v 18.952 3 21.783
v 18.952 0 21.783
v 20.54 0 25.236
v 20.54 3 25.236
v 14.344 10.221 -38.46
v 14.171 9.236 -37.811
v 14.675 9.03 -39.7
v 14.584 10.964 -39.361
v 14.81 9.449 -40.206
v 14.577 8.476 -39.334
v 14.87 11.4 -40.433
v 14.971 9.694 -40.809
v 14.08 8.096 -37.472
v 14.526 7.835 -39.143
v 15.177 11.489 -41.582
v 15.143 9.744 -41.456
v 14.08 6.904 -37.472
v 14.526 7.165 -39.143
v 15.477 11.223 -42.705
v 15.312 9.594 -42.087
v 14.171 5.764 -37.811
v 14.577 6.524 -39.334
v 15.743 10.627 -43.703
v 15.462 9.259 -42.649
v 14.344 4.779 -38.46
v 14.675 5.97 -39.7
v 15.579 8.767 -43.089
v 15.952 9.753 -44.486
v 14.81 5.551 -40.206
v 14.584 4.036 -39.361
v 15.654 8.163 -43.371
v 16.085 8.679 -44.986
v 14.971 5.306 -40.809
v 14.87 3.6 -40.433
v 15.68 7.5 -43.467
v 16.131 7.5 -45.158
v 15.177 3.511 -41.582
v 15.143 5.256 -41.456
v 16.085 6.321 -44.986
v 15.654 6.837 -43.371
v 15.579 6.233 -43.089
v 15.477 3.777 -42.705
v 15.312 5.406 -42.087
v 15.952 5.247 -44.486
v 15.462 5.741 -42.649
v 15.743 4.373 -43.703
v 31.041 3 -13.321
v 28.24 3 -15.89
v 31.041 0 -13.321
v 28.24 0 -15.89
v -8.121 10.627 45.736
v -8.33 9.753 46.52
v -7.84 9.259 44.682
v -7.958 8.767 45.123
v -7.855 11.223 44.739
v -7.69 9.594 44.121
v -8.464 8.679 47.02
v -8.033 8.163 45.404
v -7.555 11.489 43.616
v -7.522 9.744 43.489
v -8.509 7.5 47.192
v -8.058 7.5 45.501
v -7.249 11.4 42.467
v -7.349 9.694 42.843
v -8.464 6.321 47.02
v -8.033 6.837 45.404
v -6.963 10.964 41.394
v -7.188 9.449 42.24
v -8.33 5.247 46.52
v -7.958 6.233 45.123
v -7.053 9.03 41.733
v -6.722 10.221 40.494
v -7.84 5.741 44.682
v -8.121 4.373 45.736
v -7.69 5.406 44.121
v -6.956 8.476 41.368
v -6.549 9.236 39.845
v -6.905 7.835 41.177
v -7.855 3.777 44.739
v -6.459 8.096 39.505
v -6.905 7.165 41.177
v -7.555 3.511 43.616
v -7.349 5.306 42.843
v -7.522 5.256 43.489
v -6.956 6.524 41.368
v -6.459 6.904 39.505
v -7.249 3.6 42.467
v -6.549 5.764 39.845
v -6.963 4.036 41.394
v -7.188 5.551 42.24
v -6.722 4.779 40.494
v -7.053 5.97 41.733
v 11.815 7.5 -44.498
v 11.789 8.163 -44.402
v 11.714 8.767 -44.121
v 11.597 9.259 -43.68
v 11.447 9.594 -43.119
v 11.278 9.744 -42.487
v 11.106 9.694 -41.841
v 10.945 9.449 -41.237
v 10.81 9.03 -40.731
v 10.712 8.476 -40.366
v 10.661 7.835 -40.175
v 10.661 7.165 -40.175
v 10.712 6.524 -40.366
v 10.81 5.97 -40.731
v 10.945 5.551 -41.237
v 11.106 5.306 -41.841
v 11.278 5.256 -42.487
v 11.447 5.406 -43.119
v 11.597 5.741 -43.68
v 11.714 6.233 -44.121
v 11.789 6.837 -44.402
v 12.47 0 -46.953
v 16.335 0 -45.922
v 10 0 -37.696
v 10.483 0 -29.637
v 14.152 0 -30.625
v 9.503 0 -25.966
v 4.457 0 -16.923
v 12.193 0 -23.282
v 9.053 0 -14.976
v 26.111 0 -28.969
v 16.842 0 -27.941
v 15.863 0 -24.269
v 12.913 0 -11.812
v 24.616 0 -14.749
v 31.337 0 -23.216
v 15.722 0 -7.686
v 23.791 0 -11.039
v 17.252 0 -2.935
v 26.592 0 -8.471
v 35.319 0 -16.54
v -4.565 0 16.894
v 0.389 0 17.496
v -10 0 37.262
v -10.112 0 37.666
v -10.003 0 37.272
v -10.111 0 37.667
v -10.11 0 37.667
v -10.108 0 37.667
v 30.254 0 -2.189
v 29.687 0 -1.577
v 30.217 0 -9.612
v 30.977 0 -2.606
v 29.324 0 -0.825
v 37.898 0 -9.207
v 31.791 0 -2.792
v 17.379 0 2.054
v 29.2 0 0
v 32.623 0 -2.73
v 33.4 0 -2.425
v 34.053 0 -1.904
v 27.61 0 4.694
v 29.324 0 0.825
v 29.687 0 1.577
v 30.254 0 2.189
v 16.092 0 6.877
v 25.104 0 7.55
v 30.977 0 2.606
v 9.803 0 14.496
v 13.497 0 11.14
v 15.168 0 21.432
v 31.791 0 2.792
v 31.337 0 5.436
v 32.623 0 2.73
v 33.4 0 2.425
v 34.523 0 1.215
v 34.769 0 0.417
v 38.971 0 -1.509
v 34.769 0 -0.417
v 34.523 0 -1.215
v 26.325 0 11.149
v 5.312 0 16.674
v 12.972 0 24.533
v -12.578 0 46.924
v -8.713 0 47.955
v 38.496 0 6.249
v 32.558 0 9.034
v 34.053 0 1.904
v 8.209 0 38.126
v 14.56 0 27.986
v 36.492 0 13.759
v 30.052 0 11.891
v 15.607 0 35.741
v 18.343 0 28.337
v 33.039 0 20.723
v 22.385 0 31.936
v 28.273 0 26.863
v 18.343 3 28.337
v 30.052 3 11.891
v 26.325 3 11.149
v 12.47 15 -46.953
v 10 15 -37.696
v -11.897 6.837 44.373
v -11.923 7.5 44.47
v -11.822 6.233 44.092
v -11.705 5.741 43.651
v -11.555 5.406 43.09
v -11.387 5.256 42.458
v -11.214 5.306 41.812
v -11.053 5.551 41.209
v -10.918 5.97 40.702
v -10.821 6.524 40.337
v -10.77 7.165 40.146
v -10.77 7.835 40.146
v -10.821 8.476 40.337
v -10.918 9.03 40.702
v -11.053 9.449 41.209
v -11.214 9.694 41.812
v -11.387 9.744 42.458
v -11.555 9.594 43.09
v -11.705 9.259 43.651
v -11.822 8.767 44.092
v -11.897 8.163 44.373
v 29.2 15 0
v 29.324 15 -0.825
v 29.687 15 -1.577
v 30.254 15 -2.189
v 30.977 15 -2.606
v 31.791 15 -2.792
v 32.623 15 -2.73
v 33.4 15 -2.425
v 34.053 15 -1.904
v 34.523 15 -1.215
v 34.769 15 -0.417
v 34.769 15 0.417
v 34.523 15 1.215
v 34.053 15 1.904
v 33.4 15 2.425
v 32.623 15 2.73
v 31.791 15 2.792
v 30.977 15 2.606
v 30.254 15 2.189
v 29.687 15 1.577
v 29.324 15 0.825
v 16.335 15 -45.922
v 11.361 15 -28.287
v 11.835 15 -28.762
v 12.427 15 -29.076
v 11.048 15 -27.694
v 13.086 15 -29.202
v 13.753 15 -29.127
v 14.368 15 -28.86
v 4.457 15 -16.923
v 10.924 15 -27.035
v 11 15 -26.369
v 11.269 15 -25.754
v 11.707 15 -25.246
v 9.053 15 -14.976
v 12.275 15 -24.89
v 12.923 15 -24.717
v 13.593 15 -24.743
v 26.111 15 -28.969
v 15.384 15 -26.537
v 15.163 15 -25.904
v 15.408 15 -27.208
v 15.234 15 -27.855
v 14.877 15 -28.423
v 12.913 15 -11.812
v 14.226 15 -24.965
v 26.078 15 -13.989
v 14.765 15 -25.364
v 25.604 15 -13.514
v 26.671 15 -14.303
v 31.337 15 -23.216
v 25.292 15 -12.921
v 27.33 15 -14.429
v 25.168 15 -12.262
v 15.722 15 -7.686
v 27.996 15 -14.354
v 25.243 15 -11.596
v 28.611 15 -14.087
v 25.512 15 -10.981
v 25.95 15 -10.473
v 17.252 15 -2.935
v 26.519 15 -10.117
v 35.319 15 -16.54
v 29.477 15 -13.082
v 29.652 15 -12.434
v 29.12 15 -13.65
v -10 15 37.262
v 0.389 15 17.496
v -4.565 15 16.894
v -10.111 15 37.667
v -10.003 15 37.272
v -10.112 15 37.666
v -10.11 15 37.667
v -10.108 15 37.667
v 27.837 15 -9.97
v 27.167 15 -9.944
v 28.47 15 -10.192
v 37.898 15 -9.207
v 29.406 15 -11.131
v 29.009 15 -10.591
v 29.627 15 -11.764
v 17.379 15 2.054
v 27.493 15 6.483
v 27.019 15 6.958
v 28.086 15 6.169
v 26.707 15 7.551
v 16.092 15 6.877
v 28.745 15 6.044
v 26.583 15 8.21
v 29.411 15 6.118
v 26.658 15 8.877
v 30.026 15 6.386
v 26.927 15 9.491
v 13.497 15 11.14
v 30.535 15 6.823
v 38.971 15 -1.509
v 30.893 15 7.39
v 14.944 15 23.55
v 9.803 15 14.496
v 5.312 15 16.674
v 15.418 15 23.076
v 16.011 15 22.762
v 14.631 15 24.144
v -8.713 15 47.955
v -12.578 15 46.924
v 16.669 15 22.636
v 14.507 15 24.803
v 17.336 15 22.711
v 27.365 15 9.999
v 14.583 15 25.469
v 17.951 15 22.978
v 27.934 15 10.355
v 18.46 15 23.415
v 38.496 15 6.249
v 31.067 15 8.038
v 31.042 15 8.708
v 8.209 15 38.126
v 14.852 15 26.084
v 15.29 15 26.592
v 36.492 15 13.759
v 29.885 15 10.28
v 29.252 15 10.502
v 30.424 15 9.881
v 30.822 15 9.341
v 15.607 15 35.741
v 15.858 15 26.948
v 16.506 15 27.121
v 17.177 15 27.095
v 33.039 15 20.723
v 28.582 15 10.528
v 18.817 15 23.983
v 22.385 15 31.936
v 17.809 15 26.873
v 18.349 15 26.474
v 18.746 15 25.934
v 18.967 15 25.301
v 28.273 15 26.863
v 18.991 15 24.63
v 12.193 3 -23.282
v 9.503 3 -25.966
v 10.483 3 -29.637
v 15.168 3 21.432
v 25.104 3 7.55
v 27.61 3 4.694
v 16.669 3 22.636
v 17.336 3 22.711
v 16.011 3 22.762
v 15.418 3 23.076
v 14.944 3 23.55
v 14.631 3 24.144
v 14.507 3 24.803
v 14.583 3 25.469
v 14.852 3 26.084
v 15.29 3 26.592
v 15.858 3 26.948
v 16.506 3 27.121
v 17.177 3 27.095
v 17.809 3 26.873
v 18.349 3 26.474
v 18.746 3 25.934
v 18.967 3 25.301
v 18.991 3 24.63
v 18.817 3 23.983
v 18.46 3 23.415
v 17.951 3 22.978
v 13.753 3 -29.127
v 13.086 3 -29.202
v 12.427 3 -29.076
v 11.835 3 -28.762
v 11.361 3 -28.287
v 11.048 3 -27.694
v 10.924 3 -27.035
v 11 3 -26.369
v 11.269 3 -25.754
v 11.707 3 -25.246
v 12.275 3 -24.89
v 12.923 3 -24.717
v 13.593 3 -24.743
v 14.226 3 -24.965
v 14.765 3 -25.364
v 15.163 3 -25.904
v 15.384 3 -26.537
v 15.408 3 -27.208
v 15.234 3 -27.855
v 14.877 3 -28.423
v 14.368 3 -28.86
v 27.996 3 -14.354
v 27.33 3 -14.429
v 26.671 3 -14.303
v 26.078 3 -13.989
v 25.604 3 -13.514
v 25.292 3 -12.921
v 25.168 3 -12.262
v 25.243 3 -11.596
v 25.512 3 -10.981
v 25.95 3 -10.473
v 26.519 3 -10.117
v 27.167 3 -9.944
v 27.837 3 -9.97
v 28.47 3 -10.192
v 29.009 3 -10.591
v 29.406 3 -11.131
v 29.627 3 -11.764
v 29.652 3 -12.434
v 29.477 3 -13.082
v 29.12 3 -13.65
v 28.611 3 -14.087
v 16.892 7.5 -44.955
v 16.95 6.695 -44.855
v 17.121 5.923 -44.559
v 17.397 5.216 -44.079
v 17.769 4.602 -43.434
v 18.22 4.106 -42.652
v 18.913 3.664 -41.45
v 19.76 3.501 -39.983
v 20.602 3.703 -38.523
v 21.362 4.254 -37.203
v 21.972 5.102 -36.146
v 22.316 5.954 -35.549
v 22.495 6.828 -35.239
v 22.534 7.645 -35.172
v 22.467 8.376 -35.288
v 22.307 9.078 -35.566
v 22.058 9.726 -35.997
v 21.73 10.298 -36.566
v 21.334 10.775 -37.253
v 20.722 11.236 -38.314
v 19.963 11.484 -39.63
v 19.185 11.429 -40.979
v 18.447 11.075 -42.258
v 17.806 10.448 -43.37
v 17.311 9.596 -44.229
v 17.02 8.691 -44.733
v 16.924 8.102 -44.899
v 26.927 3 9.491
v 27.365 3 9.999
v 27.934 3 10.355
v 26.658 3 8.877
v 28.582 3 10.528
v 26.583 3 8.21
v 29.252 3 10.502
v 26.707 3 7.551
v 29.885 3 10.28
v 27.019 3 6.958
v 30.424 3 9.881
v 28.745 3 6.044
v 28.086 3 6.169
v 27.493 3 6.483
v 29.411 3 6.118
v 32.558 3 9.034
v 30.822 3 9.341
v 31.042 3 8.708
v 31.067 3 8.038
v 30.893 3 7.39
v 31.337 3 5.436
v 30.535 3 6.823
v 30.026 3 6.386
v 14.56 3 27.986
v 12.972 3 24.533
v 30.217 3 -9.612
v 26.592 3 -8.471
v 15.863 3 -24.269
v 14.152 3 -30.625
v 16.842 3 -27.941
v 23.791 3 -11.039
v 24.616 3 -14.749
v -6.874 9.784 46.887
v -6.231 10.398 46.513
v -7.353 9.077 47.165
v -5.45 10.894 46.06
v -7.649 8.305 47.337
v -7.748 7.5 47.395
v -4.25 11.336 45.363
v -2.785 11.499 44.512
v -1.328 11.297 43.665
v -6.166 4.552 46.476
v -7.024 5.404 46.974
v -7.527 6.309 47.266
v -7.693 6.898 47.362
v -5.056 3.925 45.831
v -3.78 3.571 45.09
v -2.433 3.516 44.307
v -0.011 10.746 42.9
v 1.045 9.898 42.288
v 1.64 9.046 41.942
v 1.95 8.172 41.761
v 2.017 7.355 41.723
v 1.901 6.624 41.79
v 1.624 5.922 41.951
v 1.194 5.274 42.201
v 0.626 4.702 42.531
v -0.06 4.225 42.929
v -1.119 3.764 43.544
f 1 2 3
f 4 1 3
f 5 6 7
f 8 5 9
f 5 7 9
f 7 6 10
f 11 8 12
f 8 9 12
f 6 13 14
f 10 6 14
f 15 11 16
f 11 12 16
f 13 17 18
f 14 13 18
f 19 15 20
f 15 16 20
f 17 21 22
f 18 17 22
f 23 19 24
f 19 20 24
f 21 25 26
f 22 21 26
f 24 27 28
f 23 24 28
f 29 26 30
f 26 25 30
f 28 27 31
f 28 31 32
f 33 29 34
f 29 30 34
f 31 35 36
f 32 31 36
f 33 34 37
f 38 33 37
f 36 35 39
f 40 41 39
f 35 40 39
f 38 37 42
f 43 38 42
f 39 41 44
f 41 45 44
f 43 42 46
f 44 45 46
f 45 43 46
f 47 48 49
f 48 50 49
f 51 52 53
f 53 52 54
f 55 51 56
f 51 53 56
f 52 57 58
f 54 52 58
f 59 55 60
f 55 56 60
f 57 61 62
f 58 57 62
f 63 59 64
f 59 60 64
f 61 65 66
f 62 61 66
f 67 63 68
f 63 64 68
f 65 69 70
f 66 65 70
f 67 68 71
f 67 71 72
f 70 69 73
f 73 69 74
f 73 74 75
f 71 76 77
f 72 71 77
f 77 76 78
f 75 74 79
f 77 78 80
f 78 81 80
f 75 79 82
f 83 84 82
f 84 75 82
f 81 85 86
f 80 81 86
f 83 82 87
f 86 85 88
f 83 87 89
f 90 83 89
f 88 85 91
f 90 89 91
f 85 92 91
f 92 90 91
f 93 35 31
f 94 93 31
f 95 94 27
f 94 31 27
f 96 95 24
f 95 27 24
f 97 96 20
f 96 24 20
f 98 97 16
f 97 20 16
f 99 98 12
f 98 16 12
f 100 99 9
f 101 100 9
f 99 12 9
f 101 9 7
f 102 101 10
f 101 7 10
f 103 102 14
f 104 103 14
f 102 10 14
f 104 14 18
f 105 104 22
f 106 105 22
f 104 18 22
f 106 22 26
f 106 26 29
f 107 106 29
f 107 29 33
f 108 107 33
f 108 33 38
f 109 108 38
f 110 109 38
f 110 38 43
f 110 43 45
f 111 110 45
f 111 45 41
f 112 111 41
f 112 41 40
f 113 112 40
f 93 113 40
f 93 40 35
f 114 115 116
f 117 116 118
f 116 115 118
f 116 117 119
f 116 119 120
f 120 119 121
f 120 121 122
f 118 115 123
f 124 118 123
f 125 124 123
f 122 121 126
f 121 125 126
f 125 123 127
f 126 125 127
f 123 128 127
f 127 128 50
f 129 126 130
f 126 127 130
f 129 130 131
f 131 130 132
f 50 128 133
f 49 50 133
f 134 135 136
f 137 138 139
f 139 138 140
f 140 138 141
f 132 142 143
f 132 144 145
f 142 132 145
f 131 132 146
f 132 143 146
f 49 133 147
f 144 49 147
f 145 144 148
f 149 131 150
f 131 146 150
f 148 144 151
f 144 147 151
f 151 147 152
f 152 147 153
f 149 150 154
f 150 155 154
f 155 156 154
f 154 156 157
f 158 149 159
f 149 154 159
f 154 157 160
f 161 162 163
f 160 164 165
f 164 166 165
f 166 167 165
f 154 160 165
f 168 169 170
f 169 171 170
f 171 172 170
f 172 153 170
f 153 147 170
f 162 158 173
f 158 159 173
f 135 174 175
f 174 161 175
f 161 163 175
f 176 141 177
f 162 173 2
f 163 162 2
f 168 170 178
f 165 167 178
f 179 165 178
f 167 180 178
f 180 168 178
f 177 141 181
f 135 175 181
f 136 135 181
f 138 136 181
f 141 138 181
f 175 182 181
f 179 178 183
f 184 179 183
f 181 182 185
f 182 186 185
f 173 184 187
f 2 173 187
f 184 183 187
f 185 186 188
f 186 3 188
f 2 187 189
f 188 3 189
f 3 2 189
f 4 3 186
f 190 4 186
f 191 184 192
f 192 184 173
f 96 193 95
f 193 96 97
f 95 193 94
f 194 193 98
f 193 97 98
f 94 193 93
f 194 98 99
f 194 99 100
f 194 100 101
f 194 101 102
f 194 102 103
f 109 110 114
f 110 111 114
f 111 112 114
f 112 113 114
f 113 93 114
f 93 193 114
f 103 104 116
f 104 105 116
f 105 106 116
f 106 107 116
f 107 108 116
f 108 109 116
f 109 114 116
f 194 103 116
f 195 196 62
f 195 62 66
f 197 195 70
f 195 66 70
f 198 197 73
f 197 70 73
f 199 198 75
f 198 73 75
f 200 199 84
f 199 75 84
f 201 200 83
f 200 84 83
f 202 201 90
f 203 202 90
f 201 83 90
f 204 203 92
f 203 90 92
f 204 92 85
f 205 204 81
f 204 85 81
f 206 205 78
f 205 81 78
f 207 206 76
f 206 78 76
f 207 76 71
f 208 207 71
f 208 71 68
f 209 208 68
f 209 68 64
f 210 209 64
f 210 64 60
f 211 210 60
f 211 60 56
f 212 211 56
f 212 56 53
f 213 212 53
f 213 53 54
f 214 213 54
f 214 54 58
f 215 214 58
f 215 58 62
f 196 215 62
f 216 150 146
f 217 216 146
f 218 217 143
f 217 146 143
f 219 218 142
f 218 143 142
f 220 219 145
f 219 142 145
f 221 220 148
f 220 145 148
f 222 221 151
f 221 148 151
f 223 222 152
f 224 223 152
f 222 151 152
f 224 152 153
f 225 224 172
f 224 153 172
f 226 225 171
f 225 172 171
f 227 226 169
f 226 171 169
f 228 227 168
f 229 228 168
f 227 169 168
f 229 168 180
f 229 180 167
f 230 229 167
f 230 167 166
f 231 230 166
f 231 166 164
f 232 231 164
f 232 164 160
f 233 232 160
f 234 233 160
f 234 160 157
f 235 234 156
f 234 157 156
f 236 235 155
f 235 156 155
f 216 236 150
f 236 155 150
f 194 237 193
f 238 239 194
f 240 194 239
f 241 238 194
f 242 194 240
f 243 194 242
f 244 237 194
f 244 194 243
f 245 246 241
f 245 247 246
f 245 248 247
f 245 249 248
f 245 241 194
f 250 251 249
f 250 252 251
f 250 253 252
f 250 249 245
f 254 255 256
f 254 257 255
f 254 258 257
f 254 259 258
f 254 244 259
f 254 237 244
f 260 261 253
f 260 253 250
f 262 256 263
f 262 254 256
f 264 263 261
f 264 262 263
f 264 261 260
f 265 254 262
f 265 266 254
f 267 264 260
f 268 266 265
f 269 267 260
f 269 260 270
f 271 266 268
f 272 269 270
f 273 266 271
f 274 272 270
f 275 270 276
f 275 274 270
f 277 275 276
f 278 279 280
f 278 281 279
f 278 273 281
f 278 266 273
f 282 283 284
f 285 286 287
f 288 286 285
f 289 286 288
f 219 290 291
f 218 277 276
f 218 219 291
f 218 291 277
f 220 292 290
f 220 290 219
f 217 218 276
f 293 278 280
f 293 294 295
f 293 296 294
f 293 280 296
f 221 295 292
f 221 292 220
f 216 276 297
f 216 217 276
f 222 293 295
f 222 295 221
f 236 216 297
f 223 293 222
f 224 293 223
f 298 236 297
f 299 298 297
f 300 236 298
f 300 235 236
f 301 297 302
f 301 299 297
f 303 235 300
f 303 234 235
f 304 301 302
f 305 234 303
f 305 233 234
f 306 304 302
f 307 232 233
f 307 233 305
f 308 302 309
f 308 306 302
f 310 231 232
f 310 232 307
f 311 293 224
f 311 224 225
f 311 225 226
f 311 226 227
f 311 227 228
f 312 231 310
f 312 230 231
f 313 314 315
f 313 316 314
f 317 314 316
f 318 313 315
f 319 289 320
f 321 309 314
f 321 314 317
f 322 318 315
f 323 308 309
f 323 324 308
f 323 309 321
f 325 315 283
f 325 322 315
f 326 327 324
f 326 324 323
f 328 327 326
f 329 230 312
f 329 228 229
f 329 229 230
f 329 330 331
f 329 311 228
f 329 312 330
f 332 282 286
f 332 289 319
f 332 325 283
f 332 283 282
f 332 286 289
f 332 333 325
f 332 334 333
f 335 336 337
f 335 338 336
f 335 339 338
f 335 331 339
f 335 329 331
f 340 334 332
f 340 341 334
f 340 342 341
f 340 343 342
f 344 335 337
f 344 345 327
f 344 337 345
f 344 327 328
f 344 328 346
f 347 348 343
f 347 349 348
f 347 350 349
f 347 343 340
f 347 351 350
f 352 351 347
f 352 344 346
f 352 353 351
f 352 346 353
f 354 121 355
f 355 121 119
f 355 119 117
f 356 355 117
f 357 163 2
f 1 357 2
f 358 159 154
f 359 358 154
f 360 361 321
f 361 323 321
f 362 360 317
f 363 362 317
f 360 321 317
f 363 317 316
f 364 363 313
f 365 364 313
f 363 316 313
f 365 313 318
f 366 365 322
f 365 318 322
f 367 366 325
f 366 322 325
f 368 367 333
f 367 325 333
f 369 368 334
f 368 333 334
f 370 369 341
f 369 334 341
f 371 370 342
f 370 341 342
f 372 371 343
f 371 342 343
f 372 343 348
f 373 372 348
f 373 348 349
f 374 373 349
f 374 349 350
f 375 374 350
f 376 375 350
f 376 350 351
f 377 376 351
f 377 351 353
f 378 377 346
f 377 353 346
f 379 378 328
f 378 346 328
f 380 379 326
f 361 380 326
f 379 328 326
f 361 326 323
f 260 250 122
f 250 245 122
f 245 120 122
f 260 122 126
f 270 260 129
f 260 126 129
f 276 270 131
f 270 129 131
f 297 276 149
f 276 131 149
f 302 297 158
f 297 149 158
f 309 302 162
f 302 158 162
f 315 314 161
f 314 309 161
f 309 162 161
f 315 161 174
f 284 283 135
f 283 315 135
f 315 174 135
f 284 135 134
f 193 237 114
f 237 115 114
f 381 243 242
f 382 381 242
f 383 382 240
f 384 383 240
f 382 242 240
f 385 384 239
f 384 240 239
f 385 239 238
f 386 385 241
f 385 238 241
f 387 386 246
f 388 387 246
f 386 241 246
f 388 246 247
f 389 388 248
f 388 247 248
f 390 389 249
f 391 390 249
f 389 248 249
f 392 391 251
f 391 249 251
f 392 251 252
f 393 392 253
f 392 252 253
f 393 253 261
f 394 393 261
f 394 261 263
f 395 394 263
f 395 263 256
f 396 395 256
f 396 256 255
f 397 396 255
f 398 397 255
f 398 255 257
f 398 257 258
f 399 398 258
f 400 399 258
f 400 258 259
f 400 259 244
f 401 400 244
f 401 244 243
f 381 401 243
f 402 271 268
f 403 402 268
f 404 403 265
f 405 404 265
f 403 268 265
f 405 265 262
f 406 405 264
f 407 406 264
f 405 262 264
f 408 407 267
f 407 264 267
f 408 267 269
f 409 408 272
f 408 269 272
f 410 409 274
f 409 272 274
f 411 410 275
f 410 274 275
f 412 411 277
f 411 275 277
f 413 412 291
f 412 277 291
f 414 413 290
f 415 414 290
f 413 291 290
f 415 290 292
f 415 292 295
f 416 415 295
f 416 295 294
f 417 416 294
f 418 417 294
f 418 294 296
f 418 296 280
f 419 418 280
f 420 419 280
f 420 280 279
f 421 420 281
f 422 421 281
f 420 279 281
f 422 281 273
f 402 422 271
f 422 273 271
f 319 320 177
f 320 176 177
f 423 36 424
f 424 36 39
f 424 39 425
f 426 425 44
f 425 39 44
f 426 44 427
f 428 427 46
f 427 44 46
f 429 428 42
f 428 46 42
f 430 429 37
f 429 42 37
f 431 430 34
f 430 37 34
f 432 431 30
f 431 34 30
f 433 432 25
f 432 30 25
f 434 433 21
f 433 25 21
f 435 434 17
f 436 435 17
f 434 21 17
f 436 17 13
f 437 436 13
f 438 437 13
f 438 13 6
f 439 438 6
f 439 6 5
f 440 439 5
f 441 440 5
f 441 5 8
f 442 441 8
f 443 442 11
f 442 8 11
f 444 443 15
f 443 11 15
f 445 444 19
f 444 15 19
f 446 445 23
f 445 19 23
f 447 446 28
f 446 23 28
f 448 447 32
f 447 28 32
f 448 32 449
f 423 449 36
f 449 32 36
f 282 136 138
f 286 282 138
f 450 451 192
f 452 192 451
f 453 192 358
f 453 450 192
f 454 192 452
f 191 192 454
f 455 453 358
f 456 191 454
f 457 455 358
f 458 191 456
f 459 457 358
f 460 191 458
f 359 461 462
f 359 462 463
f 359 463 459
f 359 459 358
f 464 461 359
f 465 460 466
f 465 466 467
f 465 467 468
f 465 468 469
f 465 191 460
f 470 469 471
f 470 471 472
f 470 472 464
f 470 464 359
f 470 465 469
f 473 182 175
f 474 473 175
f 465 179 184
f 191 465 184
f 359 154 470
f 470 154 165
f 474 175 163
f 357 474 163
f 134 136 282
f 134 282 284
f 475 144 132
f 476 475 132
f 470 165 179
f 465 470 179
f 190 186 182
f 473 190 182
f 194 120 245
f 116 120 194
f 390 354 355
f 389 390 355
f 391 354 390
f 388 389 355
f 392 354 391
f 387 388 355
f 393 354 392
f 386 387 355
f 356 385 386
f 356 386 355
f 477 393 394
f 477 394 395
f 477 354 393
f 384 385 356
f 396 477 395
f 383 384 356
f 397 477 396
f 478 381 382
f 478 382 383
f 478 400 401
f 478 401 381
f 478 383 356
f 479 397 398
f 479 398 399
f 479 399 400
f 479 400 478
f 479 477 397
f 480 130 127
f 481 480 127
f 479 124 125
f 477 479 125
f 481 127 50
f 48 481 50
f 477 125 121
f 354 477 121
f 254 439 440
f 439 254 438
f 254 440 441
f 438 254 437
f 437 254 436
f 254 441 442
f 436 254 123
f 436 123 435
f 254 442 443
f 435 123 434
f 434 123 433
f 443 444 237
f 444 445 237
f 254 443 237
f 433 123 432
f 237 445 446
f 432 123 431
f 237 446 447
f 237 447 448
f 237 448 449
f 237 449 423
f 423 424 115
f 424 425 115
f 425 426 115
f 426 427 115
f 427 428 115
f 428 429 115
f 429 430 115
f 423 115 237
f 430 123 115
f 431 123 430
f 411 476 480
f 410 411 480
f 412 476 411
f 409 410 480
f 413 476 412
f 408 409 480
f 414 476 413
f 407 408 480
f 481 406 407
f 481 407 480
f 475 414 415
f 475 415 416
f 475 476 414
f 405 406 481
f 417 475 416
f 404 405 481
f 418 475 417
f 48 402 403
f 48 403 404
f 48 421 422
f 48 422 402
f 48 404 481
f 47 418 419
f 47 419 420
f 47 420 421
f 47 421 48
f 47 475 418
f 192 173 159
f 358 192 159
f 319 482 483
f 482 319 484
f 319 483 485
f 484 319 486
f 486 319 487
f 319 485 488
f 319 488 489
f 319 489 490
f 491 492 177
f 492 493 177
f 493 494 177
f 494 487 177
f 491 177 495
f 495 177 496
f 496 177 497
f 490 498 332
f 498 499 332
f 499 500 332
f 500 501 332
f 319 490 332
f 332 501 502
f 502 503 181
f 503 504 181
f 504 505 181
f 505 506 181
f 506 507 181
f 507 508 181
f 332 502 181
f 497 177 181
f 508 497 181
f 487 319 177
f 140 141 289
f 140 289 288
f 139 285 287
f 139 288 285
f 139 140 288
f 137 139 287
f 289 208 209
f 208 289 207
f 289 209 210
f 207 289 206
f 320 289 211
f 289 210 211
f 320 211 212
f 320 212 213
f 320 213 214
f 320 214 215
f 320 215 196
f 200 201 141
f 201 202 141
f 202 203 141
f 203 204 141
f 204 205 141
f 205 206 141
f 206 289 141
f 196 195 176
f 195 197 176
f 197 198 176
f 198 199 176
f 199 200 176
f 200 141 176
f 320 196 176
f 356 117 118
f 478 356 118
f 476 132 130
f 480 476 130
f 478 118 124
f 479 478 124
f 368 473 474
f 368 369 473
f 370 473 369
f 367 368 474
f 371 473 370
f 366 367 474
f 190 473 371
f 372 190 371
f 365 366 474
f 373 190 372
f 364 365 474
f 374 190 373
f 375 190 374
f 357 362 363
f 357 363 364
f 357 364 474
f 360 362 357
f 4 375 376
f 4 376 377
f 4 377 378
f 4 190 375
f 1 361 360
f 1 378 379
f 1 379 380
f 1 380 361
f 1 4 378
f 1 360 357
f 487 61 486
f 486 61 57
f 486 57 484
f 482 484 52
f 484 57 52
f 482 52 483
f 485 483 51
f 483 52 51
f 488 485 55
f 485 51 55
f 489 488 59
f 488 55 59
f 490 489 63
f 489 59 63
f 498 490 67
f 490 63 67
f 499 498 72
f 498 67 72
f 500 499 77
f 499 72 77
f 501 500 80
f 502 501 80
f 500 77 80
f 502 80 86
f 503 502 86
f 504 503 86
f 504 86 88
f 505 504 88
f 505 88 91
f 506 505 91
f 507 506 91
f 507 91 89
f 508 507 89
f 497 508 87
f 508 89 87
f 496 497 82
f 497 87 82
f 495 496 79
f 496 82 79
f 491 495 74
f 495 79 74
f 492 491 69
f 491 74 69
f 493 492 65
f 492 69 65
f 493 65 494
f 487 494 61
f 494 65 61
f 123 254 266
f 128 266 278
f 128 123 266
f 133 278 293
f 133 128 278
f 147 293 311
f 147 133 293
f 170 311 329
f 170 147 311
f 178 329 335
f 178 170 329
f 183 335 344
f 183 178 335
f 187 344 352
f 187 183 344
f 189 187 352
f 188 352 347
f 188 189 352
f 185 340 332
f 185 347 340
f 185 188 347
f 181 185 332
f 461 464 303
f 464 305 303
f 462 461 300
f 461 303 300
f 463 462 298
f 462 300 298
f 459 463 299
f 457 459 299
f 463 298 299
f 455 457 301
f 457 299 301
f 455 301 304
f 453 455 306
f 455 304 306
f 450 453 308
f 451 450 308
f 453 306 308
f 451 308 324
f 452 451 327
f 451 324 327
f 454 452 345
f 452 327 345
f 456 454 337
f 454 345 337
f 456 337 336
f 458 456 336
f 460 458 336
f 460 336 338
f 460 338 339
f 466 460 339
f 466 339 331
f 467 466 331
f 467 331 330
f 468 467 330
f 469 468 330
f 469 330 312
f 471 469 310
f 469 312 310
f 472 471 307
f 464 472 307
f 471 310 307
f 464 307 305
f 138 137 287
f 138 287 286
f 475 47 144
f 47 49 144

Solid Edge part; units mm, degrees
sketch "Sketch1" plane through (0, 0, 0) normal (0, 1, 0) x (-1, 0, 0)
  circle A0 centre (16.756, -24.8845) radius 2.25
  circle A1 centre (27.4161, 12.1803) radius 2.25
  circle A2 centre (-7.2345, 29.1146) radius 2.25
  circle A3 centre (-21.5968, -20.8226) radius 2.25
  circle A4 centre (0, -32) radius 2.8
  circle A5 centre (0, 32) radius 2.8
  circle A6 centre (0, 0) radius 39
  circle A7 centre (-32, 0) radius 2.8
  circle A8 centre (32, 0) radius 2.8
  circle A9 centre (-24.2565, 17.6529) radius 2.25
  circle A10 centre (13.1726, 26.9533) radius 2.25
  circle A11 centre (28.8313, -8.2921) radius 2.25
  circle A12 centre (0, 0) radius 17.5
extrude "Protrusion1" add sketch "Sketch1" along normal blind 15
sketch "Sketch2" plane through (0, 15, 0) normal (0, 1, 0) x (-1, 0, 0)
  circle A0 centre (27.4161, 12.1803) radius 2.25
  circle A1 centre (32, 0) radius 2.8
  circle A2 centre (13.1726, 26.9533) radius 2.25
  circle A3 centre (16.756, -24.8845) radius 2.25
  circle A4 centre (28.8313, -8.2921) radius 2.25
  circle A5 centre (0, -32) radius 2.8
  arc A6 (4.5655, 16.894) -> (-4.4574, -16.9228) centre (0, 0) cw
  line L0 (-4.4574, -16.9228) -> (-10, -37.6962)
  arc A7 (10.1123, 37.6662) -> (-10, -37.6962) centre (0, 0) cw
  line L1 (10.1123, 37.6662) -> (10, 37.262)
  line L2 (10, 37.262) -> (4.5655, 16.894)
extrude "ExtrudedCutout_1" cut sketch "Sketch2" along normal mid plane 476
sketch "Sketch3" plane through (14.4439, 0, 0.6519) normal (0, -1, 0) x (-0.2578, 0, 0.9662)
  line L0 (51.6742, 10.1797) -> (37.8149, -3.6369)
  line L1 (37.8149, -3.6369) -> (41.6742, 14.1797)
  line L2 (41.6742, 14.1797) -> (51.6742, 14.1797)
  line L3 (51.6742, 14.1797) -> (51.6742, 10.1797)
extrude "Protrusion2" add sketch "Sketch3" against normal up to vertex (15 mm away)
sketch "Sketch4" plane through (-7.4783, 7.5, 43.3268) normal (-0.9662, 0, -0.2578) x (-0.2578, 0, 0.9662)
  circle A0 centre (0, 0) radius 2.25
extrude "ExtrudedCutout_2" cut sketch "Sketch4" along normal mid plane 49.6
sketch "Sketch5" plane through (-7.4783, 7.5, 43.3268) normal (-0.9662, 0, -0.2578) x (-0.2578, 0, 0.9662)
  circle A0 centre (0, 0) radius 4
extrude "ExtrudedCutout_3" cut sketch "Sketch5" against normal blind 13.9
mirror "Mirror1" about plane through (1.8783, 7.5, 0.5012) normal (-0.2578, 0, 0.9662) of "Protrusion2", "ExtrudedCutout_2", "ExtrudedCutout_3"
sketch "Sketch6" plane through (0, 0, 0) normal (0, 1, 0) x (-1, 0, 0)
  arc A0 (-10, -37.6962) -> (-26.1113, -28.9689) centre (0, 0) cw
  arc A1 (-26.1113, -28.9689) -> (-8.2093, 38.1262) centre (0, 0) cw
  arc A2 (-8.2093, 38.1262) -> (10.1081, 37.6673) centre (0, 0) cw
  arc A3 (10.1081, 37.6673) -> (10.1123, 37.6662) centre (0, 0) cw
  line L0 (10.1123, 37.6662) -> (10, 37.262)
  line L1 (10, 37.262) -> (4.5655, 16.894)
  arc A4 (-4.4574, -16.9228) -> (4.5655, 16.894) centre (0, 0) cw
  line L2 (-4.4574, -16.9228) -> (-10, -37.6962)
extrude "Protrusion3" add sketch "Sketch6" along normal up to vertex (15 mm away)
sketch "Sketch7" plane through (13.211, 15, 0.5012) normal (0, 1, 0) x (0.2578, 0, -0.9662)
  circle A0 centre (-22.6453, -9.7111) radius 2.25
  circle A1 centre (-3.5007, -17.1007) radius 2.25
  circle A2 centre (15.9148, -10.4557) radius 2.25
  circle A3 centre (26.5166, 7.1148) radius 2.25
extrude "ExtrudedCutout_5" cut sketch "Sketch7" against normal blind 56.1
sketch "Sketch8" plane through (0, 0, 0) normal (0, 1, 0) x (-1, 0, 0)
  circle A0 centre (-32, 0) radius 2.8
extrude "ExtrudedCutout_6" cut sketch "Sketch8" along normal blind 110.3
sketch "Sketch9" plane through (13.211, 0, 0.5012) normal (0, -1, 0) x (0.2578, 0, -0.9662)
  line L0 (-25.5718, 12.135) -> (-26.2077, 8.3886)
  line L1 (-26.2077, 8.3886) -> (-23.2811, 5.9647)
  line L2 (-23.2811, 5.9647) -> (-19.7187, 7.2872)
  line L3 (-19.7187, 7.2872) -> (-19.0828, 11.0336)
  line L4 (-19.0828, 11.0336) -> (-22.0094, 13.4575)
  line L5 (-22.0094, 13.4575) -> (-25.5718, 12.135)
  line L6 (-6.6629, 19.208) -> (-6.9068, 15.4159)
  line L7 (-6.9068, 15.4159) -> (-3.7446, 13.3086)
  line L8 (-3.7446, 13.3086) -> (-0.3386, 14.9934)
  line L9 (-0.3386, 14.9934) -> (-0.0947, 18.7856)
  line L10 (-0.0947, 18.7856) -> (-3.2568, 20.8929)
  line L11 (-3.2568, 20.8929) -> (-6.6629, 19.208)
  line L12 (17.9517, 13.6636) -> (14.1551, 13.8237)
  line L13 (14.1551, 13.8237) -> (12.1182, 10.6157)
  line L14 (12.1182, 10.6157) -> (13.8779, 7.2477)
  line L15 (13.8779, 7.2477) -> (17.6745, 7.0877)
  line L16 (17.6745, 7.0877) -> (19.7114, 10.2956)
  line L17 (19.7114, 10.2956) -> (17.9517, 13.6636)
extrude "ExtrudedCutout_7" cut sketch "Sketch9" against normal blind 3
sketch "Sketch10" plane through (13.211, 0, 0.5012) normal (0, -1, 0) x (0.2578, 0, -0.9662)
  line L0 (22.7166, -7.1148) -> (24.6166, -10.4057)
  line L1 (24.6166, -10.4057) -> (28.4166, -10.4057)
  line L2 (28.4166, -10.4057) -> (30.3166, -7.1148)
  line L3 (30.3166, -7.1148) -> (28.4166, -3.8239)
  line L4 (28.4166, -3.8239) -> (24.6166, -3.8239)
  line L5 (24.6166, -3.8239) -> (22.7166, -7.1148)
extrude "ExtrudedCutout_8" cut sketch "Sketch10" against normal blind 3
